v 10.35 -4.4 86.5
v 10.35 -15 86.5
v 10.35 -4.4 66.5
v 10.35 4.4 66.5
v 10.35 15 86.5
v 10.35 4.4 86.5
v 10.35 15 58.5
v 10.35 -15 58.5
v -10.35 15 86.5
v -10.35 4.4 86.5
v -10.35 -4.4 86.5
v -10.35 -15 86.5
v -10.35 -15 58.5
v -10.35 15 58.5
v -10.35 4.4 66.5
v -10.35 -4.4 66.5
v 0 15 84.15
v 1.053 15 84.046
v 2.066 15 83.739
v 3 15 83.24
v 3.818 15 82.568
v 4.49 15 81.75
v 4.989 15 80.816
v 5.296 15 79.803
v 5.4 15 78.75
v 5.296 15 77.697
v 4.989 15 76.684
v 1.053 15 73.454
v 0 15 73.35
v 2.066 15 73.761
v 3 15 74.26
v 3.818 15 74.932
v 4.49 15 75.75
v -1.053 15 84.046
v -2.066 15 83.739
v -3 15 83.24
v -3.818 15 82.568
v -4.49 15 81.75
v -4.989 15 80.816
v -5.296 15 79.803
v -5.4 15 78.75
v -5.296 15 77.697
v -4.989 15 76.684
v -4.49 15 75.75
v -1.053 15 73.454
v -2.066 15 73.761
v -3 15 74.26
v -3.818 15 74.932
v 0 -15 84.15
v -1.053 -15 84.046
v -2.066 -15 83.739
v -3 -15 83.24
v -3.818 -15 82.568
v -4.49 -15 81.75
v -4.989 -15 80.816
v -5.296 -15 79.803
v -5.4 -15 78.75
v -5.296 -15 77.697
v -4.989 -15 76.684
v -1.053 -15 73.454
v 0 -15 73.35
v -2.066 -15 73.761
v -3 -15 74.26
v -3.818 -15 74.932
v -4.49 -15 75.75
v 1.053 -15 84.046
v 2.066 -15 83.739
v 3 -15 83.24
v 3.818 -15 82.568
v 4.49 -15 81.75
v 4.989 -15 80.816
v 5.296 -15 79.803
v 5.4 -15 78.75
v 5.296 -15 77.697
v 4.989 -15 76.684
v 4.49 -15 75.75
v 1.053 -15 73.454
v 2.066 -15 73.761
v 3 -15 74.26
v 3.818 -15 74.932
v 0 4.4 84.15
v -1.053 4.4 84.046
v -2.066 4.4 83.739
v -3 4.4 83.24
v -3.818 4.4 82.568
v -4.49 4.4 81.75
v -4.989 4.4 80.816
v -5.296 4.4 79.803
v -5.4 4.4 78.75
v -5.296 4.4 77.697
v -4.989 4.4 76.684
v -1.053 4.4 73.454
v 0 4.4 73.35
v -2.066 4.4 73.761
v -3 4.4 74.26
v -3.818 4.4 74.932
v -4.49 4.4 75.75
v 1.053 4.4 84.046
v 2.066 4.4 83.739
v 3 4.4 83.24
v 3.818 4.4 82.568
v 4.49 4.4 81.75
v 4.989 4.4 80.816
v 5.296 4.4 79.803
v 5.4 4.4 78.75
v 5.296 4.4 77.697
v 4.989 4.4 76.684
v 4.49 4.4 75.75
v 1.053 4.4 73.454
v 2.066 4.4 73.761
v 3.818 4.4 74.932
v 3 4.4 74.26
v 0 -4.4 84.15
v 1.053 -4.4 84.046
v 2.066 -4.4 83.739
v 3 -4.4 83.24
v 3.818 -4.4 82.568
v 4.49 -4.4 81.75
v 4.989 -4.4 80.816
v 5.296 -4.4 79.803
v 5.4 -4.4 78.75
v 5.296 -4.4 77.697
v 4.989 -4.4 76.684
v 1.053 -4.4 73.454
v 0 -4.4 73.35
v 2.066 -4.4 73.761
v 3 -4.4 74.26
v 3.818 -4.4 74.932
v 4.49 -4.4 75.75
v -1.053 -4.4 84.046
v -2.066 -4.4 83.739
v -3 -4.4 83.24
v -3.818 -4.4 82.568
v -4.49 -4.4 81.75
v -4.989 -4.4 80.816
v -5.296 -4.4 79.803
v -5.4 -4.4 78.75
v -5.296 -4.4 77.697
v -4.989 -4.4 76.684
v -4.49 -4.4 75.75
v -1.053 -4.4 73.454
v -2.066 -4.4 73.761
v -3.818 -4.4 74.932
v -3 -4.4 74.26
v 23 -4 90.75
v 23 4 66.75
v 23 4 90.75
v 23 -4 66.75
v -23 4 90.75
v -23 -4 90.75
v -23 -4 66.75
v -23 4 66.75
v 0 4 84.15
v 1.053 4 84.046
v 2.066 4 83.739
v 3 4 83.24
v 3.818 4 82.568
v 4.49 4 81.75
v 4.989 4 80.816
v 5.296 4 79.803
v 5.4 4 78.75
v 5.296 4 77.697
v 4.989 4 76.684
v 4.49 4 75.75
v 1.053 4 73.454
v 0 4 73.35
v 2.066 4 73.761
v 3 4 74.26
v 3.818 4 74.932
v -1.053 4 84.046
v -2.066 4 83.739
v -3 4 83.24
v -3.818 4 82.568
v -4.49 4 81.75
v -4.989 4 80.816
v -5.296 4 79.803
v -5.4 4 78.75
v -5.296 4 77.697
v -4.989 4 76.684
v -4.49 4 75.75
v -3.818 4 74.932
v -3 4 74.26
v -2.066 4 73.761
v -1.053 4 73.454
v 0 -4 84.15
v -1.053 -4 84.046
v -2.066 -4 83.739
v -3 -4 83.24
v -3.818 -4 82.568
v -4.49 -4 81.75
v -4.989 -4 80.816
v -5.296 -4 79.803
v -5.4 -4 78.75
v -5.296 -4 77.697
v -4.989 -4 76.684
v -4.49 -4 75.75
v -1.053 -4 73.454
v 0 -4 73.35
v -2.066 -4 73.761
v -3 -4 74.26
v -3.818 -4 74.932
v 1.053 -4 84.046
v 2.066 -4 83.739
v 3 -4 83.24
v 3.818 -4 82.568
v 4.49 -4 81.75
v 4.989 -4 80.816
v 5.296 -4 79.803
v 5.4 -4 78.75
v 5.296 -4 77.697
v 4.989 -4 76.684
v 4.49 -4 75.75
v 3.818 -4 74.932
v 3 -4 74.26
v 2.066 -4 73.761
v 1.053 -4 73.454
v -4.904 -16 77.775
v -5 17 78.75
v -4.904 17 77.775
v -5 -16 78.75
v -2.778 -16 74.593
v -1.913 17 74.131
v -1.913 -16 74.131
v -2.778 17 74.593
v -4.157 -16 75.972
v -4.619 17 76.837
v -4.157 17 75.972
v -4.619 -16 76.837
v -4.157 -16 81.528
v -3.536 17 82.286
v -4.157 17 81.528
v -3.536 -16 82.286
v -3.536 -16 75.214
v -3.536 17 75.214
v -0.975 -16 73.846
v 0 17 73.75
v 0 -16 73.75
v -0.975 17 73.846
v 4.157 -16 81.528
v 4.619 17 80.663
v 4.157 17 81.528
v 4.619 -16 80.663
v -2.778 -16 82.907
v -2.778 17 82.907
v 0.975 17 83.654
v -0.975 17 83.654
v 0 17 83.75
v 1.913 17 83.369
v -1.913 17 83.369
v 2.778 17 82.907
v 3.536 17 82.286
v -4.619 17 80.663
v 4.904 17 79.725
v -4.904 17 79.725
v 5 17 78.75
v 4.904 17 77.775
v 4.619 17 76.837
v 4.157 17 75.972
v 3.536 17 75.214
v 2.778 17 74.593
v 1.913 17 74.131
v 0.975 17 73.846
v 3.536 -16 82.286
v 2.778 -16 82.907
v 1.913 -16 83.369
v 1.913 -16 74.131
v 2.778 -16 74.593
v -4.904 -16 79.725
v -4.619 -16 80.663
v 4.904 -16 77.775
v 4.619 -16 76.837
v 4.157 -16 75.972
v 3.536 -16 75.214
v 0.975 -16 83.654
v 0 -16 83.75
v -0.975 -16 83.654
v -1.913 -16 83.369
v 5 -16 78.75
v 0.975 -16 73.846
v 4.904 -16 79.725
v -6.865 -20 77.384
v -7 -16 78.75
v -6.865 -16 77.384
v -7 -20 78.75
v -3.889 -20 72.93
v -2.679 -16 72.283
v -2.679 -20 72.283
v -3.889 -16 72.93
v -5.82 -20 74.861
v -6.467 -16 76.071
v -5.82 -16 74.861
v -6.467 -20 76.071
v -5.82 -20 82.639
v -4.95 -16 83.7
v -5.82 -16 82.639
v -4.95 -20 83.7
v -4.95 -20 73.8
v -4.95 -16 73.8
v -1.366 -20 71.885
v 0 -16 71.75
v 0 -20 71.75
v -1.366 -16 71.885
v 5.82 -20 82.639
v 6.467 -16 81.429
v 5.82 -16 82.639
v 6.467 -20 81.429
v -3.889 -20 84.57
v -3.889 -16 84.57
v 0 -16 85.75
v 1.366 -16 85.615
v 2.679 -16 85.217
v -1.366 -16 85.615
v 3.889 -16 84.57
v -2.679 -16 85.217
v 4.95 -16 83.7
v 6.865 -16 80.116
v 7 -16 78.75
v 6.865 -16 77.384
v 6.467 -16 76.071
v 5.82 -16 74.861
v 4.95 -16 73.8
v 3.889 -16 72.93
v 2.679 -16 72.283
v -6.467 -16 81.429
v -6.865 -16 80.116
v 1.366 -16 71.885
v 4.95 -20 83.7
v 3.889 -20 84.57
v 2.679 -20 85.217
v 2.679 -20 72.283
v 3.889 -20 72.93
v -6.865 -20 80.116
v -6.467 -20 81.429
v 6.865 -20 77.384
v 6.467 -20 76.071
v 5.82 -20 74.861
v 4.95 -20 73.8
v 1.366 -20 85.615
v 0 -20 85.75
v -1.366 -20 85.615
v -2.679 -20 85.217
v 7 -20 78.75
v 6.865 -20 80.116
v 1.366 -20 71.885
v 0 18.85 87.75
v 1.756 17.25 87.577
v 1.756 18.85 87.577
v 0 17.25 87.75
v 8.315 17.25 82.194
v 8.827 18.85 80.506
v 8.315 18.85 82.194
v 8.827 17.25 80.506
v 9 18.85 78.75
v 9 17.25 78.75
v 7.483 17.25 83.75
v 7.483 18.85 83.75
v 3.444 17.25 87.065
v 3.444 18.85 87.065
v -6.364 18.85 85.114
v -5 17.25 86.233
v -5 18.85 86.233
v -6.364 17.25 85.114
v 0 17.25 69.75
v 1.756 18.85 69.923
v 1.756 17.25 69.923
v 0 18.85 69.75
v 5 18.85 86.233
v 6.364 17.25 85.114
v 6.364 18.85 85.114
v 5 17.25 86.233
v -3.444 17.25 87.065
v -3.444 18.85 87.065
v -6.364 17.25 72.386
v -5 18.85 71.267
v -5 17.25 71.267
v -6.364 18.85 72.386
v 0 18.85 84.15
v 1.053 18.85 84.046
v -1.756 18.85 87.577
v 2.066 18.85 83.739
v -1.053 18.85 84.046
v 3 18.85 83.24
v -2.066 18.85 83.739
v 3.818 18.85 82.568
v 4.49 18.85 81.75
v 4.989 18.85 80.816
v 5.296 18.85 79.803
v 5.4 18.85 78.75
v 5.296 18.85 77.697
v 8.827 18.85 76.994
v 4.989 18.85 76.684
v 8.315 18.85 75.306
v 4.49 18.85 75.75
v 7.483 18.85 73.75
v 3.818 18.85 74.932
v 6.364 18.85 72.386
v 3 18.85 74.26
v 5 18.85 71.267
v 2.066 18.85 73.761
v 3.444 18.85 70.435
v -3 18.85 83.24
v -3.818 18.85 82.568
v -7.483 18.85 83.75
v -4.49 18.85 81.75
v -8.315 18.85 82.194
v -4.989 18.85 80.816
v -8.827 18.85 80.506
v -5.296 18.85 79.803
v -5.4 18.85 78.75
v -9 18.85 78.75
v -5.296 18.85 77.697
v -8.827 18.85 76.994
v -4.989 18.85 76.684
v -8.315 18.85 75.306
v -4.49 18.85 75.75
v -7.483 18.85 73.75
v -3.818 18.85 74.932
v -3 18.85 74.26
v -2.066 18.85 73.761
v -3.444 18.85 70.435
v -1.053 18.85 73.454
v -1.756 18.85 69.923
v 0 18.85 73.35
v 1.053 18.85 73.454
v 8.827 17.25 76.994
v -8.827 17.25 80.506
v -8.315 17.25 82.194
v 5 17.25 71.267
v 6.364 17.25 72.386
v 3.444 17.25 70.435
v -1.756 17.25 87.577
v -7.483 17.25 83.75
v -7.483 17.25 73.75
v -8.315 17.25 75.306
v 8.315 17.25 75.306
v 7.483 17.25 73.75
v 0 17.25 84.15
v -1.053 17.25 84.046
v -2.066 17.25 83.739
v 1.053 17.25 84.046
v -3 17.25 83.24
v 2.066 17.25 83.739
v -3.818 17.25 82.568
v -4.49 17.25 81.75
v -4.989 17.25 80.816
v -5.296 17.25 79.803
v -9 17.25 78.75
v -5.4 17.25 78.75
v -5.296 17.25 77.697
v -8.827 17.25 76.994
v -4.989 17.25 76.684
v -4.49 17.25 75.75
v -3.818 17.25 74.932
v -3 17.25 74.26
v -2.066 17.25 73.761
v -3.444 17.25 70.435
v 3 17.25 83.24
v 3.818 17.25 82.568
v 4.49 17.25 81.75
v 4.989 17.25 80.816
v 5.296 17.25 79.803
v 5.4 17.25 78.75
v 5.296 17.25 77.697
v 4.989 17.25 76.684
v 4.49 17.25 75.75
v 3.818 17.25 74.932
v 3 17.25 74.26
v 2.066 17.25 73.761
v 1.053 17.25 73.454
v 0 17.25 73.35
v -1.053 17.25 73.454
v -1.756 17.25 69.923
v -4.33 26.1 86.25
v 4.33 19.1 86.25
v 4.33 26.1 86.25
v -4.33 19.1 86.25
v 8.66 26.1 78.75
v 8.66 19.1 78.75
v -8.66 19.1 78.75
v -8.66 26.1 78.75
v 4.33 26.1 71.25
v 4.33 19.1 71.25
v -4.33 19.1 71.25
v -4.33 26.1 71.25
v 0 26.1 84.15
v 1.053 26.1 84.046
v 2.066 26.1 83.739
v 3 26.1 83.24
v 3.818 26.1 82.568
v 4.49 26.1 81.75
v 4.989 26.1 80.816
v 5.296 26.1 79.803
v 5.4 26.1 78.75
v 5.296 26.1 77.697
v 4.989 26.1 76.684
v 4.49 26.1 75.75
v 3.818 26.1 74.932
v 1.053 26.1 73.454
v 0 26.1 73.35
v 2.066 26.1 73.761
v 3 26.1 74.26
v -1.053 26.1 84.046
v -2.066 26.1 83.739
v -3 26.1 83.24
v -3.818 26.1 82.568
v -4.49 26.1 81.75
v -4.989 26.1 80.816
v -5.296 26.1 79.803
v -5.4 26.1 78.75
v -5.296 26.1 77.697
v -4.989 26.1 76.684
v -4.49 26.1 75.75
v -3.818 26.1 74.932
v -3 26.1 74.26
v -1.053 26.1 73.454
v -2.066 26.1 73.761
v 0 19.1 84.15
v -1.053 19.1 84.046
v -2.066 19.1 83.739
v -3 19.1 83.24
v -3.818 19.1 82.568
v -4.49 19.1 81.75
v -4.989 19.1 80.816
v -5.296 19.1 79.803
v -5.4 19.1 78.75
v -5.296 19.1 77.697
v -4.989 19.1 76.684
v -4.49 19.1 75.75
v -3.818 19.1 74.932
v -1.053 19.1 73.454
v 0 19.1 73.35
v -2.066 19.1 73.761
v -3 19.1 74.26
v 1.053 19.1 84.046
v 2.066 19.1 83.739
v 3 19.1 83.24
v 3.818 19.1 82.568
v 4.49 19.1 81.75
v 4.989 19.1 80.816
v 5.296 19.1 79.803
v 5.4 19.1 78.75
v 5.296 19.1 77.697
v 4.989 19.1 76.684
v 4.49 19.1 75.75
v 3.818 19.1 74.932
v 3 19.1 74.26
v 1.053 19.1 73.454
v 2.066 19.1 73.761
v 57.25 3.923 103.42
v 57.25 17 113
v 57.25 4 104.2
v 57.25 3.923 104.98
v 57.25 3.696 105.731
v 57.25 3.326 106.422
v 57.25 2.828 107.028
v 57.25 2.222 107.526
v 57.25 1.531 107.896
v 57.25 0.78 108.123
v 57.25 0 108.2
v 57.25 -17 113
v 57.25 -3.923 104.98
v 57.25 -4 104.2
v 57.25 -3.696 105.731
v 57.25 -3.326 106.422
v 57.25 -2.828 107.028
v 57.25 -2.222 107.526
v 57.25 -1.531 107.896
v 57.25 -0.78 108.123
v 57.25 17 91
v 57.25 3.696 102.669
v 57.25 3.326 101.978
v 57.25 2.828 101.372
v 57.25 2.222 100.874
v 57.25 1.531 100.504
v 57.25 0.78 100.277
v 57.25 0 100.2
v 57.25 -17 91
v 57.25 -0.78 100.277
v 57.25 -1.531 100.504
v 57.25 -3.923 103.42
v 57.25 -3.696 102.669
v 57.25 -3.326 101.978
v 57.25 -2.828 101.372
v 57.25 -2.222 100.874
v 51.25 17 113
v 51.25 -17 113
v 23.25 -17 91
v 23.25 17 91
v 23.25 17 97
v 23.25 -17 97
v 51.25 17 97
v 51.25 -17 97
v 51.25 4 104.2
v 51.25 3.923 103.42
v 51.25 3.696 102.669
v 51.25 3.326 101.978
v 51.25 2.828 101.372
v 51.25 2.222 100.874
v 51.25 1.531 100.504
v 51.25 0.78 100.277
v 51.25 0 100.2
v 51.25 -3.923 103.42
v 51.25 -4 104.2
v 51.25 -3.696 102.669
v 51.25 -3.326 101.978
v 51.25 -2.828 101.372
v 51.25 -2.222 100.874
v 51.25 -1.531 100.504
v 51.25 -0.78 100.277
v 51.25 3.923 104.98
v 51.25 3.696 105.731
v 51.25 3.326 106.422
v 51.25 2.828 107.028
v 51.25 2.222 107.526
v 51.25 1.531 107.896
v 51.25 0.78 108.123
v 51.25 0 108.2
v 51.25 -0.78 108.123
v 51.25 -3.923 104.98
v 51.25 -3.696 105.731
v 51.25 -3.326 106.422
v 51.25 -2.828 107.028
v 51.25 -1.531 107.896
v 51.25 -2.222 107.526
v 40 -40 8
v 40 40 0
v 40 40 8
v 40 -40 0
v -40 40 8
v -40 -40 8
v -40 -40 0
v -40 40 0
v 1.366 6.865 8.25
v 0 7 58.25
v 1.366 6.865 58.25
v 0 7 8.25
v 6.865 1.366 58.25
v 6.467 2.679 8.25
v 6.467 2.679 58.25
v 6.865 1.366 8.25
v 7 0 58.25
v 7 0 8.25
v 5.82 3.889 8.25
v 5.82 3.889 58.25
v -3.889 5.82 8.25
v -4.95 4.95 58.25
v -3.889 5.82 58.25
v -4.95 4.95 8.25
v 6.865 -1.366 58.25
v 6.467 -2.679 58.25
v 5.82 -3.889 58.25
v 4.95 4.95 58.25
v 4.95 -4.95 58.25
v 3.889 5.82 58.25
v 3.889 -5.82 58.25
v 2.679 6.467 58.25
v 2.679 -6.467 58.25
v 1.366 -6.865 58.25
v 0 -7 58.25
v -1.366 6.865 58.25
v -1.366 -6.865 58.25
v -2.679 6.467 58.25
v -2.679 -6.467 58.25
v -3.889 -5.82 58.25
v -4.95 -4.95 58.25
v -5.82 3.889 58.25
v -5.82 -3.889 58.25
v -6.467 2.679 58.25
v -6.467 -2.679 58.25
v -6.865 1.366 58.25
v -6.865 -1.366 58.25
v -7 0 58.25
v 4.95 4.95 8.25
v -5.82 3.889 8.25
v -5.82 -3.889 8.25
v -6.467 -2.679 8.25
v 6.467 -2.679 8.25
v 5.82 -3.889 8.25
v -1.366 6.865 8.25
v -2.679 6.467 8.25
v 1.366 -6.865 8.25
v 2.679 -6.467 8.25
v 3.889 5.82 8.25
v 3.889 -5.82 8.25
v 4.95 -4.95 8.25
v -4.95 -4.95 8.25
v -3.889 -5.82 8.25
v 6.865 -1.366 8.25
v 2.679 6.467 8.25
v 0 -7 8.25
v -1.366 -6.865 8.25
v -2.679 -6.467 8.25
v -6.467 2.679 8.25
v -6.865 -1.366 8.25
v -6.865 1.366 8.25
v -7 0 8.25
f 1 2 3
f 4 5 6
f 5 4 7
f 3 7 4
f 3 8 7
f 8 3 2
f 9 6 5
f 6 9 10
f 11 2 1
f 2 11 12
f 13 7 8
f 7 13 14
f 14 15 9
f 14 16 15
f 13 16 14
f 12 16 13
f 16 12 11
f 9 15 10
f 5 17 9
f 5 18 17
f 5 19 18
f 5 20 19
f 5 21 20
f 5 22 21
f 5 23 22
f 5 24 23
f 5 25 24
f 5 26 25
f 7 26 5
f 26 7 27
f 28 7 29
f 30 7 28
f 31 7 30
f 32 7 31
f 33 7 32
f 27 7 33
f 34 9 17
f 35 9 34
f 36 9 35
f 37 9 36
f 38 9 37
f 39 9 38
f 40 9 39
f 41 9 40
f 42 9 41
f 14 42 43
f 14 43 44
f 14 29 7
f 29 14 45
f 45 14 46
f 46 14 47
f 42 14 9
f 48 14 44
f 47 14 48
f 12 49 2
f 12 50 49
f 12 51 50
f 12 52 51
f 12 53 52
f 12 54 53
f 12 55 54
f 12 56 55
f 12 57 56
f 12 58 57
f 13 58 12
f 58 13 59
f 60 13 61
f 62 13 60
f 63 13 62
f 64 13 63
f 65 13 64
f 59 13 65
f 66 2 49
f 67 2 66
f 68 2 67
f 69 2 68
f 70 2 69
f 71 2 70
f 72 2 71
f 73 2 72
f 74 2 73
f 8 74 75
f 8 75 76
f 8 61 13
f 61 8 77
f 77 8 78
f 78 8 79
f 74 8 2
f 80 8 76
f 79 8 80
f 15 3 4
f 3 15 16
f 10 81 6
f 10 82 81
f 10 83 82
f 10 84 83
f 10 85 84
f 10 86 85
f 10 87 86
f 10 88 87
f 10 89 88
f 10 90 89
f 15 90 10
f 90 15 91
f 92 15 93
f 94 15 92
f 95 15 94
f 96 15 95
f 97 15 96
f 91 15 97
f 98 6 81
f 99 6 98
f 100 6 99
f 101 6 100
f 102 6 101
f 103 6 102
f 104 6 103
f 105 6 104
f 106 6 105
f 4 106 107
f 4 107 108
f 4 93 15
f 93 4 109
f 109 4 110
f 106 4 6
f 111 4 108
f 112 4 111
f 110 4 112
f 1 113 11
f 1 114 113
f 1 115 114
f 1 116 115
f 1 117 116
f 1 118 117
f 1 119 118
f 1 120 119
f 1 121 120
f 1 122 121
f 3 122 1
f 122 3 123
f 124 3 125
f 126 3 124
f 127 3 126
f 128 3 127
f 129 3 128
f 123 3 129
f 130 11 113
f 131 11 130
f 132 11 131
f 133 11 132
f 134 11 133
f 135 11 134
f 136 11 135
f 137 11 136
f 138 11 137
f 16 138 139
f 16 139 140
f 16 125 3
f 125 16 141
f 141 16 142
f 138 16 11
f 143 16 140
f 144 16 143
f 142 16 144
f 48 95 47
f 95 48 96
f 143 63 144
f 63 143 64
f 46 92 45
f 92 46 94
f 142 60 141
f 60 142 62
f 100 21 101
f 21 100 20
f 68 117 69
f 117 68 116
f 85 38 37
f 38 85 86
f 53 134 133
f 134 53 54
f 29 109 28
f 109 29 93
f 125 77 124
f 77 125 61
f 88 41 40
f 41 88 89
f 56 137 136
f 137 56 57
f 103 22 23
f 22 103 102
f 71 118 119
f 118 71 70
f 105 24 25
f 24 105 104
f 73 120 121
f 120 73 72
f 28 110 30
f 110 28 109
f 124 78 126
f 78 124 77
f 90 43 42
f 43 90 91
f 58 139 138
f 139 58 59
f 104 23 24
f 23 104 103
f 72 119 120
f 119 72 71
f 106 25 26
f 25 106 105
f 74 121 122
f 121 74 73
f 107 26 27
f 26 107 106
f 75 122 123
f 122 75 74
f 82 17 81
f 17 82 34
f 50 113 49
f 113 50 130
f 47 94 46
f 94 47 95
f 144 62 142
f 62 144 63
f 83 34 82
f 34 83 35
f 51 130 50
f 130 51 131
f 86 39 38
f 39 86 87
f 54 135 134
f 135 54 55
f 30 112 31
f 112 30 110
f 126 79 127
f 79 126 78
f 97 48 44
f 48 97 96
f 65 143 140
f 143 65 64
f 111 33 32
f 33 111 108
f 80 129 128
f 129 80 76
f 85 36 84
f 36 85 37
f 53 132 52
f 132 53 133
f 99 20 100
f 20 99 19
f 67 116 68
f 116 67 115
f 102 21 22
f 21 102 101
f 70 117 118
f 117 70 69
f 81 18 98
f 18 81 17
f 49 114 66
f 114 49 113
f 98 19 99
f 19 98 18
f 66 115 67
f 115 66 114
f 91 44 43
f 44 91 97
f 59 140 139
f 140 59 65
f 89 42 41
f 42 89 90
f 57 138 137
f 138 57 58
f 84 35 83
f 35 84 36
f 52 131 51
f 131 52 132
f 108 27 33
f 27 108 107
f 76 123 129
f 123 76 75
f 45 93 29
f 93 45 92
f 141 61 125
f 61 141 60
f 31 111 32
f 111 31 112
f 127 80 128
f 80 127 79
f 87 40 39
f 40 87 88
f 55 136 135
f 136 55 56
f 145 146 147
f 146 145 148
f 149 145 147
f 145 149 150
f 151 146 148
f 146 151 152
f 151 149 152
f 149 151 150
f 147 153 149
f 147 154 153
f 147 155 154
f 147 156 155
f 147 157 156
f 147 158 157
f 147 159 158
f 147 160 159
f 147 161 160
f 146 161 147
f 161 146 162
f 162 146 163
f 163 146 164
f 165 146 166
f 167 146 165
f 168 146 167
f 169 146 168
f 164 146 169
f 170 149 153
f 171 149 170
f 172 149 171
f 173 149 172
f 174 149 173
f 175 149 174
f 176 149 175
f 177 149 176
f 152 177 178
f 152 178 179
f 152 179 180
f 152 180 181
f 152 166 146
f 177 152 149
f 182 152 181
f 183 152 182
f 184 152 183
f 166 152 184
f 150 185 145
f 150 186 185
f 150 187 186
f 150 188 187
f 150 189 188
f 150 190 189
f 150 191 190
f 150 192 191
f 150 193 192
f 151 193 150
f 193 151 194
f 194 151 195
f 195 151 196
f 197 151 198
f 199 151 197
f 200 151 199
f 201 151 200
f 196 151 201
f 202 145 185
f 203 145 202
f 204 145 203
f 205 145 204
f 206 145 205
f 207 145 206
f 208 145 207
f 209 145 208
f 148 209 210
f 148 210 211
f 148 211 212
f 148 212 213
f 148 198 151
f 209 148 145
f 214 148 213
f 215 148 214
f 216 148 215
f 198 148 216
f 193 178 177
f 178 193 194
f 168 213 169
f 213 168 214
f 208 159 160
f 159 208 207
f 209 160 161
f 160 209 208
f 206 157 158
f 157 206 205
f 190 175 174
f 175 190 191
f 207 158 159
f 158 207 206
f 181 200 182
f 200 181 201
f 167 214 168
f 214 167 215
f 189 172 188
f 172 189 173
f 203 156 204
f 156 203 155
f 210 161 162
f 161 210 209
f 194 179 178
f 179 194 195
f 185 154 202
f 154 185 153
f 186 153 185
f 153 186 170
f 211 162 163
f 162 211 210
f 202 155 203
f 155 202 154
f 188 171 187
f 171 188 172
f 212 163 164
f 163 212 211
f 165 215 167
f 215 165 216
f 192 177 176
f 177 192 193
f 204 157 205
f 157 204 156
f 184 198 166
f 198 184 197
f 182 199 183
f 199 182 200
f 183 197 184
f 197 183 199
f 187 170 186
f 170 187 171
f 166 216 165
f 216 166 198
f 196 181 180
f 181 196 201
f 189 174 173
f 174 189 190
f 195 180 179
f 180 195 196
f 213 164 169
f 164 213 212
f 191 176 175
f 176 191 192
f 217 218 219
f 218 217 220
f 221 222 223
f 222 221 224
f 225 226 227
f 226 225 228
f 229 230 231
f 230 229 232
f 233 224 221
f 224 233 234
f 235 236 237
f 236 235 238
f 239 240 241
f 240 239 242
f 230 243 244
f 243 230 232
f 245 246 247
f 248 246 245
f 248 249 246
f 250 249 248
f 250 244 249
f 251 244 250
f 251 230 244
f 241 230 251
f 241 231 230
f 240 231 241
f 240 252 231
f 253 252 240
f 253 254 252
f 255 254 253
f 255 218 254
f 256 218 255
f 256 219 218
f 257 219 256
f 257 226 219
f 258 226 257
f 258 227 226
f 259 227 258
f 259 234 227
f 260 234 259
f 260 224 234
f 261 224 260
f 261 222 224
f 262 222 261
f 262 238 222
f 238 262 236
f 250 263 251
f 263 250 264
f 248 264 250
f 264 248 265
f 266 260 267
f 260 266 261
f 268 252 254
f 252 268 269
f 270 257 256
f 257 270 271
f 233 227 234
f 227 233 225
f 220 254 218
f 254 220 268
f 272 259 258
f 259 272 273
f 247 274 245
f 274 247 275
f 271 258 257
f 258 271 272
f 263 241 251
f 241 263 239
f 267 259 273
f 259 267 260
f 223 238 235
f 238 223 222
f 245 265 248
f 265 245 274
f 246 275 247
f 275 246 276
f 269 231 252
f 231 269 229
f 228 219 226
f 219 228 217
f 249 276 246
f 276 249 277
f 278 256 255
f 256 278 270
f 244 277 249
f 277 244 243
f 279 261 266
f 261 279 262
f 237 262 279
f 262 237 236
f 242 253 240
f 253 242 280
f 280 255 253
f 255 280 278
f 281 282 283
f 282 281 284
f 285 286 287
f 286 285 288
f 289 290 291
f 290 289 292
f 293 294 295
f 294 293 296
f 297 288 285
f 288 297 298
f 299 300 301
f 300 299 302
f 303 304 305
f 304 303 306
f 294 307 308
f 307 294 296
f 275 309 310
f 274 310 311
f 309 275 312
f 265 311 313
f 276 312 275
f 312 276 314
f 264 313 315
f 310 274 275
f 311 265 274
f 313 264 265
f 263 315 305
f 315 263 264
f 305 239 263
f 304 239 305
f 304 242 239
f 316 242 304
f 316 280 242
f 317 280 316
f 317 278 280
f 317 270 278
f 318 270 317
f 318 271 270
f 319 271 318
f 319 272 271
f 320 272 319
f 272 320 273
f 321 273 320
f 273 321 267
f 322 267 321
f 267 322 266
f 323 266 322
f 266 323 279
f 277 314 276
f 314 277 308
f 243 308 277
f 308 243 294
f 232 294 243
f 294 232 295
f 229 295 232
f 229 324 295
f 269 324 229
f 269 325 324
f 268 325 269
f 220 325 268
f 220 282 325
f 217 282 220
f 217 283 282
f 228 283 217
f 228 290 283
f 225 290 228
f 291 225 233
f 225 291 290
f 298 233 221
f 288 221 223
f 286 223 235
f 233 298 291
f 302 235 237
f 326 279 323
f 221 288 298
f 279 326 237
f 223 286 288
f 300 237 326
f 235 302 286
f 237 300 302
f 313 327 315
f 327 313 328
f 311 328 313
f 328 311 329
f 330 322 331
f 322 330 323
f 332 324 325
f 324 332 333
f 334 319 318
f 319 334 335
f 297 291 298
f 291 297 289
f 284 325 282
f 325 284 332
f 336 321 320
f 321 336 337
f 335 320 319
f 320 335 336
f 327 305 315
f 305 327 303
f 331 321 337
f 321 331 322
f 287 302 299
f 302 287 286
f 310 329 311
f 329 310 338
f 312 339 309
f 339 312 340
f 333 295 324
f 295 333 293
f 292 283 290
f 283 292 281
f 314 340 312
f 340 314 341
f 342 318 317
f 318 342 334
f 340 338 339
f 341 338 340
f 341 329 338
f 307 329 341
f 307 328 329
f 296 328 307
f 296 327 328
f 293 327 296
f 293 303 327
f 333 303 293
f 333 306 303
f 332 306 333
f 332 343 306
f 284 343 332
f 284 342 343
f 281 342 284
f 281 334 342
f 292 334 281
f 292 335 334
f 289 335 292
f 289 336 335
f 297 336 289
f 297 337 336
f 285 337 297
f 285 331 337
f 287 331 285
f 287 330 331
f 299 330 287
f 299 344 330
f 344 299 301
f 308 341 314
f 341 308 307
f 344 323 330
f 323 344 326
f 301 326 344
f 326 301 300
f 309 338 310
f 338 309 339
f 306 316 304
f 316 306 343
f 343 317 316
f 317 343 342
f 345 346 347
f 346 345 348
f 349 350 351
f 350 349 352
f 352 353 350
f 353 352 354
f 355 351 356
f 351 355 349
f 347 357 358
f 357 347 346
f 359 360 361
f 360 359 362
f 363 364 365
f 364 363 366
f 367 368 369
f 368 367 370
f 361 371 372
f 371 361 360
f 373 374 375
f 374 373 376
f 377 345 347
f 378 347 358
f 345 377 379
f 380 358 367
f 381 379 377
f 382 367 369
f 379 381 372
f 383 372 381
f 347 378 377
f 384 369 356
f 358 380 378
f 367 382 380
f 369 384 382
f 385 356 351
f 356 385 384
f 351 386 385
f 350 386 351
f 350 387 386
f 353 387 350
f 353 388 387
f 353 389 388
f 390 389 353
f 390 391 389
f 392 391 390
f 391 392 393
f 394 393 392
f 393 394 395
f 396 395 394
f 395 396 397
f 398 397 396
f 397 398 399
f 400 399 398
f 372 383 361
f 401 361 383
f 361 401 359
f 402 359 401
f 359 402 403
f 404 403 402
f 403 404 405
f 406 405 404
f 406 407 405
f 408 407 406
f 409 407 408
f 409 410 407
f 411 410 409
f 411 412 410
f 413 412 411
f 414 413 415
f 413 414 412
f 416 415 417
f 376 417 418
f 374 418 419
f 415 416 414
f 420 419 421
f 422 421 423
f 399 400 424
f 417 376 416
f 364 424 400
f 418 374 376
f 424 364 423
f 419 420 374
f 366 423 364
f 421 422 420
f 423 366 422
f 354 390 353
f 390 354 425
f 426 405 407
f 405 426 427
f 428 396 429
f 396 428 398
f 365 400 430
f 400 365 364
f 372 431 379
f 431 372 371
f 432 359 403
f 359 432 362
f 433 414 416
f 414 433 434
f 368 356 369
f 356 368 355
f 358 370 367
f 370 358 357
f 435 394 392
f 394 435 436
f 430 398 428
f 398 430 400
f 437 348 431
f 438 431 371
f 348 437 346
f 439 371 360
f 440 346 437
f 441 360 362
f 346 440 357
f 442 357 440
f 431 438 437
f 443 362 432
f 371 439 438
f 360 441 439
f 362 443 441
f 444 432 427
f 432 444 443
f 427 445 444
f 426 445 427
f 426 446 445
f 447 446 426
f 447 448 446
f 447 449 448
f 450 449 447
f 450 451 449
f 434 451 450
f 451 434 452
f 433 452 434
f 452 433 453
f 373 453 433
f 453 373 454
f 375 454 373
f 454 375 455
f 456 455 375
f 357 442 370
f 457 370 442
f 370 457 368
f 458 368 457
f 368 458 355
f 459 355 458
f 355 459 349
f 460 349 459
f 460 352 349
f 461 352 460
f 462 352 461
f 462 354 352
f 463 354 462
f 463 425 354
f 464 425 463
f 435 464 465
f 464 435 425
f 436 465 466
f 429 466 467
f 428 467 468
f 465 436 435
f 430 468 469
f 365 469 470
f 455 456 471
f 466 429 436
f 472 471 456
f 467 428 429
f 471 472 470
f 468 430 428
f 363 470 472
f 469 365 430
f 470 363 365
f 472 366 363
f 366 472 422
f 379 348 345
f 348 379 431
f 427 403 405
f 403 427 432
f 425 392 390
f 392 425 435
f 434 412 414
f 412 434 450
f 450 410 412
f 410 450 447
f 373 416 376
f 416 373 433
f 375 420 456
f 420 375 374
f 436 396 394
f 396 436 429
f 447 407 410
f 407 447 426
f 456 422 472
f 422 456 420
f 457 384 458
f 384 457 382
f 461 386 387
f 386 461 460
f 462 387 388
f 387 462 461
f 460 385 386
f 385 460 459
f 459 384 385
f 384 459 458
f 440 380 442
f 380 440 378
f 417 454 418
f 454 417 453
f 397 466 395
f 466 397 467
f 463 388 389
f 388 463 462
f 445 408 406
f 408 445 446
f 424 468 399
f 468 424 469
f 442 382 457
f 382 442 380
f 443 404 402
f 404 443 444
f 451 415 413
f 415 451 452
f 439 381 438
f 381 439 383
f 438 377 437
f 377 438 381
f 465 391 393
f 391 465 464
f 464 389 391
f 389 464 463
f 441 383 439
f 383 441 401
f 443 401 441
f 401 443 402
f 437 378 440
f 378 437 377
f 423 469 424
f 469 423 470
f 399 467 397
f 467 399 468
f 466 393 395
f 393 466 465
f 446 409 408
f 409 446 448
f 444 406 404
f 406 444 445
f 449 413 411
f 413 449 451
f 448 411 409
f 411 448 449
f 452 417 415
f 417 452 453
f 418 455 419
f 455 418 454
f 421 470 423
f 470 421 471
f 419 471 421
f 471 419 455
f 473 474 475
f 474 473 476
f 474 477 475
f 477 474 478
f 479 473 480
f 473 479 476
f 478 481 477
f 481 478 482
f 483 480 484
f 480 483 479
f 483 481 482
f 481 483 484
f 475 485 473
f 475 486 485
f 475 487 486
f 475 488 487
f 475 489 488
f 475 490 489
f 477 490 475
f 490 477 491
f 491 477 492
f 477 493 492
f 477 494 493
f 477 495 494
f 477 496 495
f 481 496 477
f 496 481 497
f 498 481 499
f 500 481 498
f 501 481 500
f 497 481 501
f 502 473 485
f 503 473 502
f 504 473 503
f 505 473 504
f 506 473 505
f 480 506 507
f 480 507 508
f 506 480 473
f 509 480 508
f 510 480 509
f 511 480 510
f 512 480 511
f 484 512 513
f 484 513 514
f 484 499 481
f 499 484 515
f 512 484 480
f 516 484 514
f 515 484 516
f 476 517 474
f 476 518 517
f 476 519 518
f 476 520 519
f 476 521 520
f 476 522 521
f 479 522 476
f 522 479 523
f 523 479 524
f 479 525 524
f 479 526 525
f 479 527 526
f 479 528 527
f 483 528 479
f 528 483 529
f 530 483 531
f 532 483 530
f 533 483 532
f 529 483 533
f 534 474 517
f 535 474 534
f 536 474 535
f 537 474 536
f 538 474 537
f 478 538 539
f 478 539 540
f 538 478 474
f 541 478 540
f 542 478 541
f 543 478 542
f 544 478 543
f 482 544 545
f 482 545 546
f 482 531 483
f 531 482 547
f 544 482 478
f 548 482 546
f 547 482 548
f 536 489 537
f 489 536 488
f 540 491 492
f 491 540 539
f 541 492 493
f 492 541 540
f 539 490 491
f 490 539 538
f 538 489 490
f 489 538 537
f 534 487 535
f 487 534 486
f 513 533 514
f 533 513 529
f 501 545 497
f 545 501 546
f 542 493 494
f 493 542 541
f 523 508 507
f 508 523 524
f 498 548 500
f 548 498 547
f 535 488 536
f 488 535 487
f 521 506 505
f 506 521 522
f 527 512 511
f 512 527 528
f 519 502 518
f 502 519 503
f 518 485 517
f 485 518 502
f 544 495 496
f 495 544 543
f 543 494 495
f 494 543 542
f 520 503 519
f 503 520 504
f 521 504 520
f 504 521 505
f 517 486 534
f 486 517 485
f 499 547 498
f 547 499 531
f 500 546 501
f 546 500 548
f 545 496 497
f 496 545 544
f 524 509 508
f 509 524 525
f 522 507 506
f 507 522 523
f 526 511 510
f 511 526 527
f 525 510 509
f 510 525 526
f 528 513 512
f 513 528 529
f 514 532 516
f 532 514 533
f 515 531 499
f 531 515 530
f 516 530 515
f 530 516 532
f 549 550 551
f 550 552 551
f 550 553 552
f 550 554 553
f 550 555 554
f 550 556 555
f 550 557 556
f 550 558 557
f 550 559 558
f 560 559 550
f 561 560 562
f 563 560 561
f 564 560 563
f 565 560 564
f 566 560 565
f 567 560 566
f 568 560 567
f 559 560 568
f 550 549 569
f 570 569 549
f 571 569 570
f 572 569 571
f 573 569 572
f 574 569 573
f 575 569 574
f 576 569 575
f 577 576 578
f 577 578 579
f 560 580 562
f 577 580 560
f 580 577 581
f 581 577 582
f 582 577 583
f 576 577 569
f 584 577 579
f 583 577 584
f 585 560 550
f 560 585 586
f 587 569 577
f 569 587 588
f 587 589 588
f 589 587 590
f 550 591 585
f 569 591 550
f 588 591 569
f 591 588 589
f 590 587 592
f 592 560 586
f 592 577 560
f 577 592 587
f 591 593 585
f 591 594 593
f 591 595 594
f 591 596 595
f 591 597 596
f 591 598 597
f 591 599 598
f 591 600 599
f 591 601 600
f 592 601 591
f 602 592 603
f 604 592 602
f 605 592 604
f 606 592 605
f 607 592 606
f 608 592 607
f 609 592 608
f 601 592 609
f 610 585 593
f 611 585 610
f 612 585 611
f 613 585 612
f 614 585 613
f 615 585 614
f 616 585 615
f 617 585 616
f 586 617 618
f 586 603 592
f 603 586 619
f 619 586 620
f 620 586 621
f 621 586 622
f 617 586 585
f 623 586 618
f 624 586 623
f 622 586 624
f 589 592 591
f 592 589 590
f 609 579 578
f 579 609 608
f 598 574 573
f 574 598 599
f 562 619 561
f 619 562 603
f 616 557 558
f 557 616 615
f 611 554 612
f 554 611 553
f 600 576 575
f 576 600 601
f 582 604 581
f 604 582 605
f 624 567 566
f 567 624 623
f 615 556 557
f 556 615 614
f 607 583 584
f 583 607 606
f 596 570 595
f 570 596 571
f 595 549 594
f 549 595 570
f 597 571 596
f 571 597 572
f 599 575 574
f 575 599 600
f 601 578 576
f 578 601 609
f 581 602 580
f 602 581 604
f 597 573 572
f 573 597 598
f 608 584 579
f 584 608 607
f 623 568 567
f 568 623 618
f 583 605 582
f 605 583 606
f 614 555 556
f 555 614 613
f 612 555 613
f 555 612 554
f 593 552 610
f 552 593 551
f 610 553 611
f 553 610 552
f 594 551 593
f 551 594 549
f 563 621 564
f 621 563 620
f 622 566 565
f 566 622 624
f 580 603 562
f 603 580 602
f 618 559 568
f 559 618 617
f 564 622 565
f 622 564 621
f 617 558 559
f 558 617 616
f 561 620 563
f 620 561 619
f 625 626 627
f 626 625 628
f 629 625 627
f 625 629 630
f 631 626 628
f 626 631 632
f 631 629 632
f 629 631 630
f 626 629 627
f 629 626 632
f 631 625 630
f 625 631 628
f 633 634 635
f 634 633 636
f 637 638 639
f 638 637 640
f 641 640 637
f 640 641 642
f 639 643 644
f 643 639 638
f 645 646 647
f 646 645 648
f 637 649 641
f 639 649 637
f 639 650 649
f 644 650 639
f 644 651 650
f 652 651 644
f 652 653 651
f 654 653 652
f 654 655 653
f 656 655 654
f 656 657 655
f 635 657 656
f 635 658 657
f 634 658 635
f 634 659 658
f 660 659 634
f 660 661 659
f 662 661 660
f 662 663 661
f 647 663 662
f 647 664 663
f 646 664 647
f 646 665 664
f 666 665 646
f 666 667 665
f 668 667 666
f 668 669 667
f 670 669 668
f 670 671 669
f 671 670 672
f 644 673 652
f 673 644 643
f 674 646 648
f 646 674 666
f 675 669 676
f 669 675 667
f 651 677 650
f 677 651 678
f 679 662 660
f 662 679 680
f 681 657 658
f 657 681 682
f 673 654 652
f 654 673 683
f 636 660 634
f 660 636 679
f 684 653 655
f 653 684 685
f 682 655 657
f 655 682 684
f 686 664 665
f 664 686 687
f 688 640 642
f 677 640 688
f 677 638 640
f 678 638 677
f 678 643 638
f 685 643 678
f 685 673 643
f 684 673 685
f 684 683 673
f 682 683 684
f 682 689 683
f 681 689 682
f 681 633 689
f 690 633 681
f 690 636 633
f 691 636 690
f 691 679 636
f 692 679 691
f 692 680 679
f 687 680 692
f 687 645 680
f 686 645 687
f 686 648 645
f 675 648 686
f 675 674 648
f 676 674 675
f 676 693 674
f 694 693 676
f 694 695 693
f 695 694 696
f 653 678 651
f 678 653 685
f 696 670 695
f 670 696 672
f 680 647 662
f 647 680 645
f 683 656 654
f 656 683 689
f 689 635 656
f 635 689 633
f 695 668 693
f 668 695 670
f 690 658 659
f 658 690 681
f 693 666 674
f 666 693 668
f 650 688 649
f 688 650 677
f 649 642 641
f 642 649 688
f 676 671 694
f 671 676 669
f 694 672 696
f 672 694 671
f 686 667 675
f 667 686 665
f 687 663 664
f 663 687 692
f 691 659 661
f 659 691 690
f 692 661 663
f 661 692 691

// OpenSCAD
$fn = 32;

// ------------------------------------------------------------------------
// Lamp arm: column d14 x 50 mm, arm 46 mm
// Every part is its own module, assembly() places every instance.
// ------------------------------------------------------------------------

// --- part 1 ---
module lamp_base() {
  difference() {
    translate([-40, -40, 0]) cube([80, 80, 8]);
  }
}

// --- part 2 ---
module lamp_column() {
  cylinder(h = 50, d = 14);
}

// --- part 3 ---
module head_fork() {
  difference() {
    translate([-10.35, -15, 0]) cube([20.7, 30, 28]);
    translate([-11.35, -4.4, 8]) cube([22.7, 8.8, 21]);
    translate([0, 0, 20.25]) rotate([90, 0, 0]) cylinder(h = 32, d = 10.8, center = true);
  }
}

// --- part 4 ---
module lamp_arm() {
  difference() {
    translate([-23, -4, 0]) cube([46, 8, 24]);
    translate([0, 0, 12]) rotate([90, 0, 0]) cylinder(h = 10, d = 10.8, center = true);
  }
}

// --- part 5 ---
module arm_pin() {
  rotate([0, 90, 0]) cylinder(h = 34, d = 10, center = true);
  translate([-20, 0, 0]) rotate([0, 90, 0]) cylinder(h = 4, d = 14);
}

// --- part 6 ---
module arm_washer() {
  difference() {
      translate([0, 0, 0]) cylinder(h = 1.6, d = 18);
      translate([0, 0, -1]) cylinder(h = 3.6, d = 10.8);
    }
}

// --- part 7 ---
module arm_nut() {
  difference() {
    linear_extrude(height = 7) polygon(points = [[8.66, 0], [4.33, 7.5], [-4.33, 7.5], [-8.66, 0], [-4.33, -7.5], [4.33, -7.5]]);
    translate([0, 0, -1]) cylinder(h = 9, d = 10.8);
  }
}

// --- part 8 ---
module shade_bracket() {
  difference() {
    translate([-17, -17, 0]) cube([34, 34, 22]);
    translate([-18, -18, 6]) cube([29, 36, 17]);
    translate([14, 0, 13.2]) rotate([0, 90, 0]) cylinder(h = 8, d = 8, center = true);
  }
}

// --- assembly ---
module assembly() {
  color([0.80, 0.24, 0.20]) translate([0, 0, 0]) rotate([0, 0, 0]) lamp_base();
  color([0.20, 0.45, 0.75]) translate([0, 0, 8.25]) rotate([0, 0, 0]) lamp_column();
  color([0.25, 0.62, 0.32]) translate([0, 0, 58.5]) rotate([0, 0, 0]) head_fork();
  color([0.92, 0.70, 0.18]) translate([0, 0, 66.75]) rotate([0, 0, 0]) lamp_arm();
  color([0.58, 0.35, 0.70]) translate([0, 0, 78.75]) rotate([0, 0, 90]) arm_pin();
  color([0.16, 0.66, 0.66]) translate([0, 18.85, 78.75]) rotate([90, 0, 0]) arm_washer();
  color([0.85, 0.48, 0.18]) translate([0, 26.1, 78.75]) rotate([90, 0, 0]) arm_nut();
  color([0.55, 0.60, 0.65]) translate([40.25, 0, 91]) rotate([0, 0, 0]) shade_bracket();
}

assembly();
